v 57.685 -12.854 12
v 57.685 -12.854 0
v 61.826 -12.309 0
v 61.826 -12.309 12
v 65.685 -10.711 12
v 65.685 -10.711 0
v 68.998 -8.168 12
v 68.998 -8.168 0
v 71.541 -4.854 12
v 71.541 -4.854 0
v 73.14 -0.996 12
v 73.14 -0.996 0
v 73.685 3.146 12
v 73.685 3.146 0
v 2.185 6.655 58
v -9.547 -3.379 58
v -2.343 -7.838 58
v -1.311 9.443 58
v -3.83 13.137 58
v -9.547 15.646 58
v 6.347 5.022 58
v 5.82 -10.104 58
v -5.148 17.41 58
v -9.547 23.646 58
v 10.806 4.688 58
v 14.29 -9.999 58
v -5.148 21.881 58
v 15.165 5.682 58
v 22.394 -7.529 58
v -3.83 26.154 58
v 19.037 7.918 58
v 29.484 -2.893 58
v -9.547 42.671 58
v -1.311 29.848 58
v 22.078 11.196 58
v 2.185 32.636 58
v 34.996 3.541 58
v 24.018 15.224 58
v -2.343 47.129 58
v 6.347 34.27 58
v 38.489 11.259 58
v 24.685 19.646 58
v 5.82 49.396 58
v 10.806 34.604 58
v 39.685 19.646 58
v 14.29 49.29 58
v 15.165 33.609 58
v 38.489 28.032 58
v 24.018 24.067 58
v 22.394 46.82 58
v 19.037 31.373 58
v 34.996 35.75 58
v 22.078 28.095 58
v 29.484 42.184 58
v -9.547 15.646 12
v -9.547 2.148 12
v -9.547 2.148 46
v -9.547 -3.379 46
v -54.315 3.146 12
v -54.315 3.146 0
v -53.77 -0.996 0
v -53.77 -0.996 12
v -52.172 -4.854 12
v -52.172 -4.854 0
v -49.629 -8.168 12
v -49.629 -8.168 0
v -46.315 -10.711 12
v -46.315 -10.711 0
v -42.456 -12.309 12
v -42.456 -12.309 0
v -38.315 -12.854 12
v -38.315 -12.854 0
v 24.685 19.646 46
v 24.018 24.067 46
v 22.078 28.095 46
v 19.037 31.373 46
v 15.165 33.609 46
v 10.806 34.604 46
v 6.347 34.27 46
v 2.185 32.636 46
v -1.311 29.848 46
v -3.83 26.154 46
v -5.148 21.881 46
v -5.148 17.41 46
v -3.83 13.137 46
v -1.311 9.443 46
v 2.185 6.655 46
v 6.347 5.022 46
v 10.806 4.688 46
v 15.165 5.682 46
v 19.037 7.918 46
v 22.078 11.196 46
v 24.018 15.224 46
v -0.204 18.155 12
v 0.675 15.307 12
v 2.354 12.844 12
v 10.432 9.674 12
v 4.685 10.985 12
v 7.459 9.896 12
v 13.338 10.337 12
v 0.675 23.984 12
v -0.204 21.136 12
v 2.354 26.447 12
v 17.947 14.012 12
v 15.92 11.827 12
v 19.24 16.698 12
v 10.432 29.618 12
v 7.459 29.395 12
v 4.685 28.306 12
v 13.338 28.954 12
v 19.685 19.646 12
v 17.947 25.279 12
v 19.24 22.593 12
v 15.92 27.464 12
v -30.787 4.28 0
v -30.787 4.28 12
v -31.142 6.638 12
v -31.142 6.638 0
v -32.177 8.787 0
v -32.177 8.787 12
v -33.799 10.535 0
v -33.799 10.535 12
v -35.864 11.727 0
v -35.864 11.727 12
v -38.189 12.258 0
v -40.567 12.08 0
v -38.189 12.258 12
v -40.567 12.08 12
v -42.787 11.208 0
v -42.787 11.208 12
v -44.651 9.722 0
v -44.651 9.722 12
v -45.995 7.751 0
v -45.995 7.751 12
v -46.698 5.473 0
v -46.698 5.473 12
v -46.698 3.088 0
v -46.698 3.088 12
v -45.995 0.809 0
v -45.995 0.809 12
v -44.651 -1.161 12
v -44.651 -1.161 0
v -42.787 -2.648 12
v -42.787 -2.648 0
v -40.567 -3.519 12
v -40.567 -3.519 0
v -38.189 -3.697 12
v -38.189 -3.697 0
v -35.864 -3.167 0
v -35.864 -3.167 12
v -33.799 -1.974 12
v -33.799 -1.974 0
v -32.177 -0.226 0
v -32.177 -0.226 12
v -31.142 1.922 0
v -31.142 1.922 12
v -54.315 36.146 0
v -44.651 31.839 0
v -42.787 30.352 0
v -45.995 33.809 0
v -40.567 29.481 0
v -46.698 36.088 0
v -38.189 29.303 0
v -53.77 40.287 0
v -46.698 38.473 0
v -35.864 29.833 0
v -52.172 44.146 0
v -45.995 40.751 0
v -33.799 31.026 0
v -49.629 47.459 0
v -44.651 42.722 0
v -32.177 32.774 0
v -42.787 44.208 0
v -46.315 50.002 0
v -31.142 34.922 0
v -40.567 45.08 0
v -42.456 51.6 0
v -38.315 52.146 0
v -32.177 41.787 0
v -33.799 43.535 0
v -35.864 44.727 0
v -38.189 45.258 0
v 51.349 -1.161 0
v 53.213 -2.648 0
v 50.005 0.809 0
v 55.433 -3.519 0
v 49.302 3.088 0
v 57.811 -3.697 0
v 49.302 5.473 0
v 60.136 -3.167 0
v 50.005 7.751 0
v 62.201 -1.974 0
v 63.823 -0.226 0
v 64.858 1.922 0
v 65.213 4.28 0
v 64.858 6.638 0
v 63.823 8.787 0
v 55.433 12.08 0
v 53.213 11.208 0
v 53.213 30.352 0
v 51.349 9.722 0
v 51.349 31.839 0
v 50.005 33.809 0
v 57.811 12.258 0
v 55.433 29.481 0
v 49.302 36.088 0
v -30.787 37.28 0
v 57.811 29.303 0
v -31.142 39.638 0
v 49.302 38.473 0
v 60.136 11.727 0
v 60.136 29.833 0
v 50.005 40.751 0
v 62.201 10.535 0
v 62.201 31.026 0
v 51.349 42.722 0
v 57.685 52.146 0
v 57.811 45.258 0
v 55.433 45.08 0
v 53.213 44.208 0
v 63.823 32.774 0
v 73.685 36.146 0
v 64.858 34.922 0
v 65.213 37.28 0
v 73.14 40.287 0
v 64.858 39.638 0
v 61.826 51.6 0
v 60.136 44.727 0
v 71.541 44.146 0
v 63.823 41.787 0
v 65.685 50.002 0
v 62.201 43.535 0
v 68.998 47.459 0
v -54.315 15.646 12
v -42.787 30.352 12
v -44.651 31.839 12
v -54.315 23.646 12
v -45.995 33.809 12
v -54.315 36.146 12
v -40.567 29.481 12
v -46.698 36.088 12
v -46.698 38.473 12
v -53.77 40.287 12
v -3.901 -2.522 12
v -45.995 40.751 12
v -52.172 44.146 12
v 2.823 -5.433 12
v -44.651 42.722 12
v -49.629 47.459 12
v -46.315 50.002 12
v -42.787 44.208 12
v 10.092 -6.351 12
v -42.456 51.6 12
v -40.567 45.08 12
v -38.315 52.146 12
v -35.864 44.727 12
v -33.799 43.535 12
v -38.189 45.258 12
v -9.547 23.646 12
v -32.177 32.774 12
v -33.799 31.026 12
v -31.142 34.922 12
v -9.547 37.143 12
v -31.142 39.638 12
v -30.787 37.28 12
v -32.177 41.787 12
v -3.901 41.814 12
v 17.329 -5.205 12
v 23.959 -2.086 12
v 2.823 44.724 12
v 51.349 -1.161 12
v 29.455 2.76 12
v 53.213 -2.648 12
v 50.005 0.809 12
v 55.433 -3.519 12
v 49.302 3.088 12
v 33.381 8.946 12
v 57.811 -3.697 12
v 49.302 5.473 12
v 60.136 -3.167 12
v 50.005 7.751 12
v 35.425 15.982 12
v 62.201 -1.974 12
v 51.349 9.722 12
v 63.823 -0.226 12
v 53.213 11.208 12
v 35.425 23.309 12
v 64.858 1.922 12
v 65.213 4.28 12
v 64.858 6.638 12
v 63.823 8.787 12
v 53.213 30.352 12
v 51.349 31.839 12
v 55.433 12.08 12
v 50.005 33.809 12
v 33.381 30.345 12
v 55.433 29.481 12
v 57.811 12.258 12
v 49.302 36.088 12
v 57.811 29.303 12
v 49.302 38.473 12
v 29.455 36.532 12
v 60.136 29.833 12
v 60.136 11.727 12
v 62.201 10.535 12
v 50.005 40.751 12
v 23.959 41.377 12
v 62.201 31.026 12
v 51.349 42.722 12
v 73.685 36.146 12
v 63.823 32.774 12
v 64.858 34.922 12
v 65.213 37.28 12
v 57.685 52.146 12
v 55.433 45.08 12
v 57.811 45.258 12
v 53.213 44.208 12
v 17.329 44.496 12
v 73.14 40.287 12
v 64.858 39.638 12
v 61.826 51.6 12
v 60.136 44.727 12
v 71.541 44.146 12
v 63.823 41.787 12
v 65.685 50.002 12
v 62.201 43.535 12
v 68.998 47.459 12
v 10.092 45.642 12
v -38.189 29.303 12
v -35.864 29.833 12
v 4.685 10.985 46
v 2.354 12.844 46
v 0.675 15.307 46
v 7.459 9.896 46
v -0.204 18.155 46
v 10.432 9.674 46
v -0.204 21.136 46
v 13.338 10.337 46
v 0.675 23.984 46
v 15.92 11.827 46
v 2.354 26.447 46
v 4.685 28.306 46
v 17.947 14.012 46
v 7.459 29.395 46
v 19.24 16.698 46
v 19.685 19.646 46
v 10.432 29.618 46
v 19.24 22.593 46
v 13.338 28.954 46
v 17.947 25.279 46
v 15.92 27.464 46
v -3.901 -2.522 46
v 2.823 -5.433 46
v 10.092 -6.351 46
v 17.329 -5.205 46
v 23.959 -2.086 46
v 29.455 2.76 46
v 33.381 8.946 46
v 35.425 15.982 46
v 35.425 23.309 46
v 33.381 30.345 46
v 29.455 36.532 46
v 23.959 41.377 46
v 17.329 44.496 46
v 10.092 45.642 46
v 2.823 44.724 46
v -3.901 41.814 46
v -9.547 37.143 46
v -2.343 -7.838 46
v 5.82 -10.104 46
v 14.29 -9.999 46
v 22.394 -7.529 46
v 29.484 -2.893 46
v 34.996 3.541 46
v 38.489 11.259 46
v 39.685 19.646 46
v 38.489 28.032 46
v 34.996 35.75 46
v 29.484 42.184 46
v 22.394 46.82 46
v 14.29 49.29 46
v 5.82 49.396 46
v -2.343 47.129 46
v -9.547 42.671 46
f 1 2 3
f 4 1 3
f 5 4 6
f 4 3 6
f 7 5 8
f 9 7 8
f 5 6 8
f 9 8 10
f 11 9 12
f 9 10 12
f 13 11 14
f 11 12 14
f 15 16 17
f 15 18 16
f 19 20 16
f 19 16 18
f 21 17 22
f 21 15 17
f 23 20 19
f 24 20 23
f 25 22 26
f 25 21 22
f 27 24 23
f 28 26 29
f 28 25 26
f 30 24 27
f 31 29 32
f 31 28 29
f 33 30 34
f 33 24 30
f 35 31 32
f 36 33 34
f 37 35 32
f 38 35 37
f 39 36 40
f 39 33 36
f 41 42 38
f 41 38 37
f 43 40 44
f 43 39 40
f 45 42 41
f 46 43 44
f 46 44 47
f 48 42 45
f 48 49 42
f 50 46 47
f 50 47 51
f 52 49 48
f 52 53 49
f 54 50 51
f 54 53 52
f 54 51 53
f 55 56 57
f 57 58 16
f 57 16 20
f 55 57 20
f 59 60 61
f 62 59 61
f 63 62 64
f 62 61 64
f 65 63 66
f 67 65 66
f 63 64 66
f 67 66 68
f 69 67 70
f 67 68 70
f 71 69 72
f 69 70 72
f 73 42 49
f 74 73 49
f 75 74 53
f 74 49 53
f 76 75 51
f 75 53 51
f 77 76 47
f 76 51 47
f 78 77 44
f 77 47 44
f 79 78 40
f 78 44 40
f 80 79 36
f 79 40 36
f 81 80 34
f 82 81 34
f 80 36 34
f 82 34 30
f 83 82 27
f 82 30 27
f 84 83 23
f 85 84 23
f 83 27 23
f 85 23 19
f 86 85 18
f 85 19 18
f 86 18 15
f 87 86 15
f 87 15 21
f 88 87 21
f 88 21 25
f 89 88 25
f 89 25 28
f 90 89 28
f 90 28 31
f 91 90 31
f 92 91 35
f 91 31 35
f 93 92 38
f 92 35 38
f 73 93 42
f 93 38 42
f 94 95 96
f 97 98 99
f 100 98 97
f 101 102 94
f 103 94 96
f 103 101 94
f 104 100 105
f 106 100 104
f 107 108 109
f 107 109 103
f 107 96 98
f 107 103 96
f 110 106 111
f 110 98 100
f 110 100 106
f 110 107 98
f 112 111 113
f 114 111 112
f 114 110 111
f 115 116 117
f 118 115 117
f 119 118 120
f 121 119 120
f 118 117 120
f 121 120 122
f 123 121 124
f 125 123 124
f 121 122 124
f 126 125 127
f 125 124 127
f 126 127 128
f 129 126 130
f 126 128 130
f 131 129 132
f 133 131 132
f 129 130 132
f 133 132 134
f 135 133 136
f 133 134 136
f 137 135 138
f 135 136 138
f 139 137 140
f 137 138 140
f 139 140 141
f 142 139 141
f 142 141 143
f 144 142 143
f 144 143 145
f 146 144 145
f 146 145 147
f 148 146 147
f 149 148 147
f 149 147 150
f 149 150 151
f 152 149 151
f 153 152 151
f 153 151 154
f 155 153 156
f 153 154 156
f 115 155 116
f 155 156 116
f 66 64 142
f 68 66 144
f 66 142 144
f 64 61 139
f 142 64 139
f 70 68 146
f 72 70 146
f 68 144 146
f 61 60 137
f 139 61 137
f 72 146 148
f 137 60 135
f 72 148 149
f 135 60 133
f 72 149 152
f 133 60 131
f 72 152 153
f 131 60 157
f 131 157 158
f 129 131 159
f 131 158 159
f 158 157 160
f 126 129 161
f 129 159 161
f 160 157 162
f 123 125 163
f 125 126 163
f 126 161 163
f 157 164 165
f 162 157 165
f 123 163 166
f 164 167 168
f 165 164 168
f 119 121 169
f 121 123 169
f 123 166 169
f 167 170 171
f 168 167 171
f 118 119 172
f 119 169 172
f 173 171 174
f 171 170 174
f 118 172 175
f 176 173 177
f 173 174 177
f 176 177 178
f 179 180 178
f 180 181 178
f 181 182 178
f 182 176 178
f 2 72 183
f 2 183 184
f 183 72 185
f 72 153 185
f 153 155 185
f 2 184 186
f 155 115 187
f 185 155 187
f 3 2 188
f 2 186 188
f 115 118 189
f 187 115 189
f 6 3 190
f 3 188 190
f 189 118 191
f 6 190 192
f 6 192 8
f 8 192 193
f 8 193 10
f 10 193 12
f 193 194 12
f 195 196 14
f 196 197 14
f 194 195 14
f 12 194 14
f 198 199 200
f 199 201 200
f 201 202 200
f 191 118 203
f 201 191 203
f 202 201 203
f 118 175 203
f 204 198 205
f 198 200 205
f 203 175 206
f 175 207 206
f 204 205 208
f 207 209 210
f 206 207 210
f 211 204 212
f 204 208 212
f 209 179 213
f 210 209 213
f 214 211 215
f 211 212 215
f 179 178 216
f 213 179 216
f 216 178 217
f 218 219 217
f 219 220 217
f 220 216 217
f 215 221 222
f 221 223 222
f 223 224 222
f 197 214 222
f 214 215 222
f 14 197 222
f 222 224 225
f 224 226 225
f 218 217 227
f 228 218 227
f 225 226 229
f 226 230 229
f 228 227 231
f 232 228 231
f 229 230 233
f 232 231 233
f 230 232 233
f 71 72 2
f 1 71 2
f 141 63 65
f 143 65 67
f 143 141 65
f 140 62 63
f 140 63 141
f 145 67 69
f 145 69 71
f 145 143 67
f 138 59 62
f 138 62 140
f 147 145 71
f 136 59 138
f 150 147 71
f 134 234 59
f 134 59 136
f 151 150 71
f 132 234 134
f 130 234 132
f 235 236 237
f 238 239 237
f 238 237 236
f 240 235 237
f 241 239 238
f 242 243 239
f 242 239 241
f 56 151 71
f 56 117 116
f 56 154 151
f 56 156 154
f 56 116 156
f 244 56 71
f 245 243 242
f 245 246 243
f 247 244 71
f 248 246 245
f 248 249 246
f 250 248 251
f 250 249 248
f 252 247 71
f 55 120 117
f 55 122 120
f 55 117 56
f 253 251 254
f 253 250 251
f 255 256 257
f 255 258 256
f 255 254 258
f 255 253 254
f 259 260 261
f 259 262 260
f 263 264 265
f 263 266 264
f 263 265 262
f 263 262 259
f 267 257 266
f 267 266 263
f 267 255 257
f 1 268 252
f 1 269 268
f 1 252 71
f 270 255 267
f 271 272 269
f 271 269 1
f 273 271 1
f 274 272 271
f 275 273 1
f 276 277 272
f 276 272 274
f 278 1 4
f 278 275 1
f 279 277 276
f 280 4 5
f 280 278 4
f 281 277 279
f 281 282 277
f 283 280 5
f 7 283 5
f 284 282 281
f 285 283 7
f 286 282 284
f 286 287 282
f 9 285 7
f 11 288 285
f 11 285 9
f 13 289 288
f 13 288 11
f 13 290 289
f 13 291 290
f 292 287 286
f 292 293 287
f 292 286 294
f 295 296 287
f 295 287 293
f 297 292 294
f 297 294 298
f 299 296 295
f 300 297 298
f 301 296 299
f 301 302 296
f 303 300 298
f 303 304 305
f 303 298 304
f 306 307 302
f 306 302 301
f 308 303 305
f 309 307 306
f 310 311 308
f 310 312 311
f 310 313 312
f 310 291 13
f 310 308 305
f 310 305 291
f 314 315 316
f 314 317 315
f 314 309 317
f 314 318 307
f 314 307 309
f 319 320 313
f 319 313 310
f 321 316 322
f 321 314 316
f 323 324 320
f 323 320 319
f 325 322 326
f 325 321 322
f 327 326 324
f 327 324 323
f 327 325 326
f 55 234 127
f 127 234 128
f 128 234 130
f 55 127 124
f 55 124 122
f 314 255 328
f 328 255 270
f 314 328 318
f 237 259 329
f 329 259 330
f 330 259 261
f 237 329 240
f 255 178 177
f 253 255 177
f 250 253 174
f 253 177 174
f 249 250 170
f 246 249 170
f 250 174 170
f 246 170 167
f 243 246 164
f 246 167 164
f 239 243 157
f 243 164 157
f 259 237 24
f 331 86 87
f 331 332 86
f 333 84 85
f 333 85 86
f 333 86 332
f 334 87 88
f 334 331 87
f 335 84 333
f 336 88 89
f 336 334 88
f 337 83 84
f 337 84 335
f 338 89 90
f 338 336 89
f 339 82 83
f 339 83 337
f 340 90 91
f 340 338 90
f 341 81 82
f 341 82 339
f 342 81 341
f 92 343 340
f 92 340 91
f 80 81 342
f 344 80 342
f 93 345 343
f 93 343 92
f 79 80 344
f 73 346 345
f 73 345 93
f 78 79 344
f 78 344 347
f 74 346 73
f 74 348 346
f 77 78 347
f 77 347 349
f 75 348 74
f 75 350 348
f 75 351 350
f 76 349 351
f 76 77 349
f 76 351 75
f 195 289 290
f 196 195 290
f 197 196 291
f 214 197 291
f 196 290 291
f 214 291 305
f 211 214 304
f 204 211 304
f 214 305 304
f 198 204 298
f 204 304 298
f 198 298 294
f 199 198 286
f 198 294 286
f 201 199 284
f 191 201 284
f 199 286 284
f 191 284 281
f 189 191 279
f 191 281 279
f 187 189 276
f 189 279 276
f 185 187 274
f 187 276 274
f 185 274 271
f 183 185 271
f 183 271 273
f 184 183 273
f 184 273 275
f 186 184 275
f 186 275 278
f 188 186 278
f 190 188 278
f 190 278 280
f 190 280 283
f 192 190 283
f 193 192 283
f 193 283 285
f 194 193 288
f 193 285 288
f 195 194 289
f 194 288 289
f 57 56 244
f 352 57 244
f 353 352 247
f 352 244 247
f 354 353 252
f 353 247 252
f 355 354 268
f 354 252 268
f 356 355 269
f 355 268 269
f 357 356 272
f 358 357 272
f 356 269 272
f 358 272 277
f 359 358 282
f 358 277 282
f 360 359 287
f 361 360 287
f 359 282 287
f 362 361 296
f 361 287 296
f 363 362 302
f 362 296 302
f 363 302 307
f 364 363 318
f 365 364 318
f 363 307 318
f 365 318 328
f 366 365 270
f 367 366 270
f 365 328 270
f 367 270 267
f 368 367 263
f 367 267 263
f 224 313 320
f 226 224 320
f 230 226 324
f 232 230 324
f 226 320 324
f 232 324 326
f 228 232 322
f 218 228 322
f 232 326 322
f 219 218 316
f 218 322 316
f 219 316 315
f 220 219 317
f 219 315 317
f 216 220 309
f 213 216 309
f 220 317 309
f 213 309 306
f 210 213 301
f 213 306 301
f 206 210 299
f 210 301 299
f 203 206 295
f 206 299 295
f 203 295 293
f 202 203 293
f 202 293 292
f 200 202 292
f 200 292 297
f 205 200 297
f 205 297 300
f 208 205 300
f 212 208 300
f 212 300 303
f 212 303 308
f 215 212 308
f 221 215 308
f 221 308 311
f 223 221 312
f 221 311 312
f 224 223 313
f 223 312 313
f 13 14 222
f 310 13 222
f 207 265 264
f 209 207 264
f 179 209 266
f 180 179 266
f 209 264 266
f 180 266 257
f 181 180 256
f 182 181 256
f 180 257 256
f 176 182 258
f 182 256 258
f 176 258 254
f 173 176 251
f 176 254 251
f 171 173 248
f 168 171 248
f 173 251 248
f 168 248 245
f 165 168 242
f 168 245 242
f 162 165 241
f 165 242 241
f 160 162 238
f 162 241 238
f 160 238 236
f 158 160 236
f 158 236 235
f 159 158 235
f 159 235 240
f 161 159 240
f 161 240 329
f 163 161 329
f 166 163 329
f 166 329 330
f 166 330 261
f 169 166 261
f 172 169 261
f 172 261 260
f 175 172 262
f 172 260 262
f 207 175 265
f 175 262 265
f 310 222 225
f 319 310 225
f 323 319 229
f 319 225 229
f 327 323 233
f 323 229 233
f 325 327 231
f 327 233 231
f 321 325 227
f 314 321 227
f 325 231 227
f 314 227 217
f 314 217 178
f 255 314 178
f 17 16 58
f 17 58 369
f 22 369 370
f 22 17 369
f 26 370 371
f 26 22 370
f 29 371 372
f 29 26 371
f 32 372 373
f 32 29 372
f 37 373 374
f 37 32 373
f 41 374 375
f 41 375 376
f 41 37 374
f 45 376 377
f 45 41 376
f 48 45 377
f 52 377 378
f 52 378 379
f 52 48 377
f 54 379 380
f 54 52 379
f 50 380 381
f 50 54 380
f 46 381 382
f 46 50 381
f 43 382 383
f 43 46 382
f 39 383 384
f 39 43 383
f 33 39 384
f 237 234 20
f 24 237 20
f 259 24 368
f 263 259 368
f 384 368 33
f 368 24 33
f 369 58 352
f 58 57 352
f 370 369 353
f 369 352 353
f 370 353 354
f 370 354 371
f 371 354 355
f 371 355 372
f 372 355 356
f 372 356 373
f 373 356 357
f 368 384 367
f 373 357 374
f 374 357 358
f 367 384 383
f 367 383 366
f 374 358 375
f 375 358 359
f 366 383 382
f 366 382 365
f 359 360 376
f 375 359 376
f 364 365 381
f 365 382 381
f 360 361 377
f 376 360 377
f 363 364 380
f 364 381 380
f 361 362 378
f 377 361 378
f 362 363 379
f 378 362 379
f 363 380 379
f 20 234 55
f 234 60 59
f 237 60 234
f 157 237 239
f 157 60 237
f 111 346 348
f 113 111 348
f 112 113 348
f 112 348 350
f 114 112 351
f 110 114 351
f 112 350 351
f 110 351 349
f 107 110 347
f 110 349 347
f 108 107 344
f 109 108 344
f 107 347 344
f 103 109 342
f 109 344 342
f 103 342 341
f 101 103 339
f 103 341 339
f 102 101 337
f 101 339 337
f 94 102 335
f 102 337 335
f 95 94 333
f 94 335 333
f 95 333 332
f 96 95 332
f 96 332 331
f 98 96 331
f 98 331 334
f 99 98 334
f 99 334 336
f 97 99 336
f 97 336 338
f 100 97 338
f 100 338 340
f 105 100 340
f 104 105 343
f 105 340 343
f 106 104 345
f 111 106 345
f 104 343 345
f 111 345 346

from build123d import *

# Parameters (mm, degrees)
F1_DEPTH  = 12
F2_R      = 8
F3_DEPTH  = 12
F4_R      = 26
F5_DEPTH  = 46
F6_R      = 15
F7_DEPTH  = 12
F8_R      = 10
F9_DEPTH  = 34
F10_R     = 30
F10_R_2   = 26
F11_DEPTH = 12
F13_DEPTH = 46
F14_W     = 44.7685575615
F14_H     = 8
F15_DEPTH = 46
F17_DEPTH = 25


with BuildPart() as f1:
    # F0 (on Top) → F1 (new body)
    with BuildSketch(Plane.XY):
        with BuildLine():
            ThreePointArc((-54.3153104275, 3.1455838755), (-49.6290189265, -8.1681246235), (-38.3153104275, -12.8544161245))
            Line((-38.3153104275, -12.8544161245), (57.6846895725, -12.8544161245))
            ThreePointArc((57.6846895725, -12.8544161245), (68.9983980715, -8.1681246235), (73.6846895725, 3.1455838755))
            Line((73.6846895725, 3.1455838755), (73.6846895725, 36.1455838755))
            ThreePointArc((73.6846895725, 36.1455838755), (68.9983980715, 47.4592923745), (57.6846895725, 52.1455838755))
            Line((57.6846895725, 52.1455838755), (-38.3153104275, 52.1455838755))
            ThreePointArc((-38.3153104275, 52.1455838755), (-49.6290189265, 47.4592923745), (-54.3153104275, 36.1455838755))
            Line((-54.3153104275, 36.1455838755), (-54.3153104275, 3.1455838755))
        make_face()
    extrude(amount=F1_DEPTH)

    # F2 (on face) → F3 (cut)
    with BuildSketch(Plane.XY.offset(12)):
        with Locations((-38.7868596536, 37.2802639987)):
            Circle(F2_R)
        with Locations((-38.7868596536, 4.2802639987)):
            Circle(F2_R)
        with Locations((57.2131403464, 4.2802639987)):
            Circle(F2_R)
        with Locations((57.2131403464, 37.2802639987)):
            Circle(F2_R)
    extrude(amount=-F3_DEPTH, mode=Mode.SUBTRACT)

    # F4 (on face) → F5 (join)
    with BuildSketch(Plane.XY.offset(12)):
        with Locations((9.6846895725, 19.6455838755)):
            Circle(F4_R)
    extrude(amount=F5_DEPTH)

    # F6 (on face) → F7 (cut)
    with BuildSketch(Plane.XY.offset(58)):
        with Locations((9.6846895725, 19.6455838755)):
            Circle(F6_R)
    extrude(amount=-F7_DEPTH, mode=Mode.SUBTRACT)

    # F8 (on face) → F9 (cut)
    with BuildSketch(Plane.XY.offset(46)):
        with Locations((9.6846895725, 19.6455838755)):
            Circle(F8_R)
    extrude(amount=-F9_DEPTH, mode=Mode.SUBTRACT)

    # F10 (on face) → F11 (join)
    with BuildSketch(Plane.XY.offset(58)):
        with Locations((9.6846895725, 19.6455838755)):
            Circle(F10_R)
        with Locations((9.6846895725, 19.6455838755)):
            Circle(F10_R_2, mode=Mode.SUBTRACT)
    extrude(amount=-F11_DEPTH)

    # F12 (on face) → F13 (cut)
    with BuildSketch(Plane.XY.offset(58)):
        with BuildLine():
            Line((-9.546752866, -3.3794377691), (-9.546752866, 42.6706055201))
            ThreePointArc((-9.546752866, 42.6706055201), (-20.3153104275, 19.6455838755), (-9.546752866, -3.3794377691))
        make_face()
    extrude(amount=-F13_DEPTH, mode=Mode.SUBTRACT)

    # F14 (on face) → F15 (join)
    with BuildSketch(Plane.XY.offset(12)):
        with Locations((-31.9310316467, 19.6455838755)):
            Rectangle(F14_W, F14_H)
    extrude(amount=F15_DEPTH)

    # F16 (on face) → F17 (cut)
    with BuildSketch(Plane.XZ.offset(-15.6455838755)):
        Polygon((-54.3153104275, 12), (-9.546752866, 58), (-54.3153104275, 58), align=None)
    extrude(amount=-F17_DEPTH, mode=Mode.SUBTRACT)


solid = f1.part
